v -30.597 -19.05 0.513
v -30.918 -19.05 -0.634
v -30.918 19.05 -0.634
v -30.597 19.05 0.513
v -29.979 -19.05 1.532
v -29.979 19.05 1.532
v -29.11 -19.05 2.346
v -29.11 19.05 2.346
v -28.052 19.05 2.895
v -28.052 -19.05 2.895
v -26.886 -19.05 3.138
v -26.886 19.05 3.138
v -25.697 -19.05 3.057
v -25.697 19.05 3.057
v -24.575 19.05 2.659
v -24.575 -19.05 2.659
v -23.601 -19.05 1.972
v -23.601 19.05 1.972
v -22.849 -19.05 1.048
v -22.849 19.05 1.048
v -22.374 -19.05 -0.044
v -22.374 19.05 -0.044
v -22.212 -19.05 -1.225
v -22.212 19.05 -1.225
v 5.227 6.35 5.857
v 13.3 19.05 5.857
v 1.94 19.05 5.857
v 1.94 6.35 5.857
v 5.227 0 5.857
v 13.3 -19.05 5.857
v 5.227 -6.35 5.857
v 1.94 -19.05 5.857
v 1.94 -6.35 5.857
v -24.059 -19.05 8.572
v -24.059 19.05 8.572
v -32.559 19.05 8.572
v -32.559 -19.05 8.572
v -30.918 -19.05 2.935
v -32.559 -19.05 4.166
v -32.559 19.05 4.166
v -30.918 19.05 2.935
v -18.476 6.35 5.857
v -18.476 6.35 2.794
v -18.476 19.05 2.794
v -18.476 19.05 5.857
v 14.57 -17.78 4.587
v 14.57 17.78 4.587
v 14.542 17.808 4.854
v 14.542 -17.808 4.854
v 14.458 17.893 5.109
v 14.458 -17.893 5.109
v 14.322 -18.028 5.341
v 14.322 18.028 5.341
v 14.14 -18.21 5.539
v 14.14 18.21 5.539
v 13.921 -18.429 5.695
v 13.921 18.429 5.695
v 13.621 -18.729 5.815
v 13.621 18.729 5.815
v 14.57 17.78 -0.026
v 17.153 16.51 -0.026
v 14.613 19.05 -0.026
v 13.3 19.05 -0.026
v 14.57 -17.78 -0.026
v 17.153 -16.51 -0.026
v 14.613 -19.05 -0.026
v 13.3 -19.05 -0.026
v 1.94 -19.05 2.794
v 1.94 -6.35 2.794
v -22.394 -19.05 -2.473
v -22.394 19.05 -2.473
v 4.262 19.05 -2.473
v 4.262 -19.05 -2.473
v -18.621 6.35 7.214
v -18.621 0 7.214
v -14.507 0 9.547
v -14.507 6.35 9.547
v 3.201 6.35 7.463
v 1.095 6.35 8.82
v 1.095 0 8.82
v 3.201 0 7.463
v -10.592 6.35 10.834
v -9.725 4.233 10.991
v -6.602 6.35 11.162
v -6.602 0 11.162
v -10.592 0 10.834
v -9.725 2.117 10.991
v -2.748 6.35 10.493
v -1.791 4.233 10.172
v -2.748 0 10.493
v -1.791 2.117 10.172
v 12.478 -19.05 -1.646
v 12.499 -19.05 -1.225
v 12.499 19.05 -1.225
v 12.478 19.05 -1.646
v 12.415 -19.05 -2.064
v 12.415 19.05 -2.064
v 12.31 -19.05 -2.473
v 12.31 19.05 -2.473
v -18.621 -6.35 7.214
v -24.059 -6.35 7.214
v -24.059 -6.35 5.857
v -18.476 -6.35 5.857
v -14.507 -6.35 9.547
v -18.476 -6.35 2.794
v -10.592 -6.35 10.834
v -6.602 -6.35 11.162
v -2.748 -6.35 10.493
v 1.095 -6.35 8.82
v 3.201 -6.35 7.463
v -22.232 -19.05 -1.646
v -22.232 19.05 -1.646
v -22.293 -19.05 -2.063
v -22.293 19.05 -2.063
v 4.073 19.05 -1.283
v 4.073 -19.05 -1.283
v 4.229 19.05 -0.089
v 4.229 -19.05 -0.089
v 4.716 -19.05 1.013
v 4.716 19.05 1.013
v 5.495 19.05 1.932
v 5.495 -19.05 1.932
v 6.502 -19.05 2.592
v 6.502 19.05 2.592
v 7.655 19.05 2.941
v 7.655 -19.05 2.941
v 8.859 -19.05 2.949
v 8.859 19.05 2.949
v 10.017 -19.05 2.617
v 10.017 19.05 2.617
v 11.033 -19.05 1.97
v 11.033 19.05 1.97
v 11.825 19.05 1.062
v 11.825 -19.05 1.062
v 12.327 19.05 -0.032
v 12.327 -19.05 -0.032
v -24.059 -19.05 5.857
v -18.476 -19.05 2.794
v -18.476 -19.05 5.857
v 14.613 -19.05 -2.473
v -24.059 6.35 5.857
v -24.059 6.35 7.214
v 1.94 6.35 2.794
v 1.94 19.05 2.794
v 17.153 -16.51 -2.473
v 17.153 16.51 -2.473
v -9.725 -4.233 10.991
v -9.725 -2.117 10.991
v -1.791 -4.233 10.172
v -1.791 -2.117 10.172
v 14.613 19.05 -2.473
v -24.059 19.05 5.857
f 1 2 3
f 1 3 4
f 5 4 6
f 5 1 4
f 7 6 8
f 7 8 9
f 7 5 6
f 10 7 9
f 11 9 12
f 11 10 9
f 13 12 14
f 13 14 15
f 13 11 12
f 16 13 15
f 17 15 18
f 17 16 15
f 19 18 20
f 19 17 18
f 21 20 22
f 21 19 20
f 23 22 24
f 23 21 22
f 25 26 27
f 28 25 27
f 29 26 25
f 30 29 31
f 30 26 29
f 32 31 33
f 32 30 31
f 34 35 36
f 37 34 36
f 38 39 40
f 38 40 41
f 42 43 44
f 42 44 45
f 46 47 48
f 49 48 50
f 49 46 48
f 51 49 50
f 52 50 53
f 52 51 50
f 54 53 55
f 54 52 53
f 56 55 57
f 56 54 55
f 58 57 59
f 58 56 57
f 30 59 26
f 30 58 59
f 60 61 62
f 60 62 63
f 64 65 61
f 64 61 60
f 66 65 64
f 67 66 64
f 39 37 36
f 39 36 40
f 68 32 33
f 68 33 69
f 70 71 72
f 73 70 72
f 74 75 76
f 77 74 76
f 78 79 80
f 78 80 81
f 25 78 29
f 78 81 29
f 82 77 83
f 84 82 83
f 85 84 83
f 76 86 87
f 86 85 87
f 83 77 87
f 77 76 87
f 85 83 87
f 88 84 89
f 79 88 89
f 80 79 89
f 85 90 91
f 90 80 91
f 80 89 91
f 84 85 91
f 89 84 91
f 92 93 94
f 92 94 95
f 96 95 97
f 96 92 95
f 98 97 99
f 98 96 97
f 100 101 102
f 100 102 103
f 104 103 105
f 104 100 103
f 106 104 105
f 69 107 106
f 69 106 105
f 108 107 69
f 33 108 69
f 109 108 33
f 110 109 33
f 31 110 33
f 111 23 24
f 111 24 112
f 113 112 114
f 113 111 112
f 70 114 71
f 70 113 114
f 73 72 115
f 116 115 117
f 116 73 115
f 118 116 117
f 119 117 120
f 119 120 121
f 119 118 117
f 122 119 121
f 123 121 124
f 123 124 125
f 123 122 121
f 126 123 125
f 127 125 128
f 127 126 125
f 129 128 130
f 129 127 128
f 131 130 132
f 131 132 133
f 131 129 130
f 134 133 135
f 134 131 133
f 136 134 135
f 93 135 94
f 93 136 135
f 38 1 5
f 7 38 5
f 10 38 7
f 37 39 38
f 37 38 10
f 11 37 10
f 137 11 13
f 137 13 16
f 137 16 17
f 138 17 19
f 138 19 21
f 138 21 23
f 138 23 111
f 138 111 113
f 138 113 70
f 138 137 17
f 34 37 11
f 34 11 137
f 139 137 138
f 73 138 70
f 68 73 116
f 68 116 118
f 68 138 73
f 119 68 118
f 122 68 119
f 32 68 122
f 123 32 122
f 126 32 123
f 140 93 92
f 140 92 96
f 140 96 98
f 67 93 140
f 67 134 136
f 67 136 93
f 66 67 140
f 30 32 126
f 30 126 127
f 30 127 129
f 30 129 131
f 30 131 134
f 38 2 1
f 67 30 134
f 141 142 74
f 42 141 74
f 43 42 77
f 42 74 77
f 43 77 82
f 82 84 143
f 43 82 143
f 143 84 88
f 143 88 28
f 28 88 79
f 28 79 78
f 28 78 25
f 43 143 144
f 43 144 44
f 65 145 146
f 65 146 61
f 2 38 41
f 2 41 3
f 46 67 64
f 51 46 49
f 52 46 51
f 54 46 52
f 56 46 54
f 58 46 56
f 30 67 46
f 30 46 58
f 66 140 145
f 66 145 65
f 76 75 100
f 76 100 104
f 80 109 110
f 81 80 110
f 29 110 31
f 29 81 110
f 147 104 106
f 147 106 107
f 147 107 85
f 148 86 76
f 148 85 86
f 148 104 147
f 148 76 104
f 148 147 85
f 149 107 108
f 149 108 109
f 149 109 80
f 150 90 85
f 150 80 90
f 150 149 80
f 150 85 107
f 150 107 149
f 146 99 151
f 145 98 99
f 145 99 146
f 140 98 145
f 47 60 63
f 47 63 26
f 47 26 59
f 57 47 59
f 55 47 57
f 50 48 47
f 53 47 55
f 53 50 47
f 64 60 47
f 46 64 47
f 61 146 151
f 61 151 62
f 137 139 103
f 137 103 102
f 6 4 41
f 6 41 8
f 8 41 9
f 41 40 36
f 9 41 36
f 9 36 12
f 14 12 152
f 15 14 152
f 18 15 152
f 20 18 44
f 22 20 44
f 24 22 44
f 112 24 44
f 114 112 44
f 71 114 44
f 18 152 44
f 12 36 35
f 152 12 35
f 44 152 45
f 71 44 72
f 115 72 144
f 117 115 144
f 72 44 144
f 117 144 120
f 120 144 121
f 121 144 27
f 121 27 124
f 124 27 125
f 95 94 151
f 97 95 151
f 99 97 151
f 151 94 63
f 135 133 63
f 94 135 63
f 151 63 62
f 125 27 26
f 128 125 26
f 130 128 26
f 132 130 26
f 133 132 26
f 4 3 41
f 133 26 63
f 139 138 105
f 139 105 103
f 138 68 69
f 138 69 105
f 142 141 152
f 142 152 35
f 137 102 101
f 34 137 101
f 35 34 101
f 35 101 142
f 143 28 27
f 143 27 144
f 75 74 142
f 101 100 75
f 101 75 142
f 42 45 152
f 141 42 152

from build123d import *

# Parameters (mm, degrees)
F1_DEPTH = 19.05
F2_DEPTH = 6.35
F3_DEPTH = 6.35
F4_SIZE  = 2.54
F5_SIZE  = 1.27
F6_R     = 1.27


with BuildPart() as f1:
    # F0 (on Front) → F1 (new body, symmetric)
    with BuildSketch(Plane.XZ):
        with BuildLine():
            Line((-24.059453, 8.571546), (-32.558522, 8.571546))
            Line((-32.558522, 8.571546), (-32.558522, 4.165861))
            Line((-32.558522, 4.165861), (-30.917545, 2.935127))
            Line((-30.917545, 2.935127), (-30.917545, 0))
            Line((-30.917545, 0), (-30.917545, -0.634123))
            ThreePointArc((-30.917545, -0.634123), (-26.288961, 3.138165), (-22.212116, -1.224549))
            ThreePointArc((-22.212116, -1.224549), (-22.257831, -1.855194), (-22.394021, -2.472653))
            Line((-22.394021, -2.472653), (4.261856, -2.472653))
            ThreePointArc((4.261856, -2.472653), (7.65477, 2.941104), (12.499143, -1.224549))
            ThreePointArc((12.499143, -1.224549), (12.451597, -1.855724), (12.310032, -2.472653))
            Line((12.310032, -2.472653), (17.1531, -2.472653))
            Line((17.1531, -2.472653), (17.1531, -0.025919))
            Line((17.1531, -0.025919), (14.57005, -0.025919))
            Line((14.57005, -0.025919), (14.57005, 0))
            Line((14.57005, 0), (14.57005, 5.856519))
            Line((14.57005, 5.856519), (10.009351, 5.856519))
            Line((10.009351, 5.856519), (5.226919, 5.856519))
            Line((5.226919, 5.856519), (1.940277, 5.856519))
            Line((1.940277, 5.856519), (1.940277, 2.793992))
            Line((1.940277, 2.793992), (-18.475659, 2.793992))
            Line((-18.475659, 2.793992), (-18.475659, 5.856519))
            Line((-18.475659, 5.856519), (-18.621231, 5.856519))
            Line((-18.621231, 5.856519), (-24.059453, 5.856519))
            Line((-24.059453, 5.856519), (-24.059453, 6.833025))
            Line((-24.059453, 6.833025), (-24.059453, 7.214033))
            Line((-24.059453, 7.214033), (-24.059453, 8.571546))
        make_face()
    extrude(amount=F1_DEPTH, both=True)

    # F0 (on Front) → F2 (join, symmetric)
    with BuildSketch(Plane.XZ):
        with BuildLine():
            add(Edge.make_bspline(
                [(-18.621231, 7.214033), (-9.229071, 13.654015), (-1.348382, 11.55533), (5.226919, 5.856519)],
                knots=[0, 0, 0, 0, 23.886756, 23.886756, 23.886756, 23.886756], degree=3))
            Line((-18.621231, 7.214033), (-18.621231, 5.856519))
            Line((-18.621231, 5.856519), (-18.475659, 5.856519))
            Line((-18.475659, 5.856519), (-18.475659, 2.793992))
            Line((-18.475659, 2.793992), (1.940277, 2.793992))
            Line((1.940277, 2.793992), (1.940277, 5.856519))
            Line((1.940277, 5.856519), (5.226919, 5.856519))
        make_face()
    extrude(amount=F2_DEPTH, both=True)

    # F0 (on Front) → F3 (join, symmetric)
    with BuildSketch(Plane.XZ):
        Polygon((-18.621231, 7.214033), (-24.059453, 7.214033), (-24.059453, 6.833025), (-24.059453, 5.856519), (-18.621231, 5.856519), align=None)
    extrude(amount=F3_DEPTH, both=True)

    # F4
    f4_edges = [f1.edges().sort_by_distance(p)[0] for p in [
        (17.1531, -19.05, -1.249286),
        (17.1531, 19.05, -1.249286),
    ]]
    chamfer(f4_edges, length=F4_SIZE)

    # F5
    f5_edges = [f1.edges().sort_by_distance(p)[0] for p in [
        (14.57005, -19.05, 2.9153),
        (14.57005, 19.05, 2.9153),
    ]]
    chamfer(f5_edges, length=F5_SIZE)

    # F6
    f6_edges = [f1.edges().sort_by_distance(p)[0] for p in [
        (14.57005, 0, 5.856519),
    ]]
    fillet(f6_edges, radius=F6_R)


solid = f1.part
